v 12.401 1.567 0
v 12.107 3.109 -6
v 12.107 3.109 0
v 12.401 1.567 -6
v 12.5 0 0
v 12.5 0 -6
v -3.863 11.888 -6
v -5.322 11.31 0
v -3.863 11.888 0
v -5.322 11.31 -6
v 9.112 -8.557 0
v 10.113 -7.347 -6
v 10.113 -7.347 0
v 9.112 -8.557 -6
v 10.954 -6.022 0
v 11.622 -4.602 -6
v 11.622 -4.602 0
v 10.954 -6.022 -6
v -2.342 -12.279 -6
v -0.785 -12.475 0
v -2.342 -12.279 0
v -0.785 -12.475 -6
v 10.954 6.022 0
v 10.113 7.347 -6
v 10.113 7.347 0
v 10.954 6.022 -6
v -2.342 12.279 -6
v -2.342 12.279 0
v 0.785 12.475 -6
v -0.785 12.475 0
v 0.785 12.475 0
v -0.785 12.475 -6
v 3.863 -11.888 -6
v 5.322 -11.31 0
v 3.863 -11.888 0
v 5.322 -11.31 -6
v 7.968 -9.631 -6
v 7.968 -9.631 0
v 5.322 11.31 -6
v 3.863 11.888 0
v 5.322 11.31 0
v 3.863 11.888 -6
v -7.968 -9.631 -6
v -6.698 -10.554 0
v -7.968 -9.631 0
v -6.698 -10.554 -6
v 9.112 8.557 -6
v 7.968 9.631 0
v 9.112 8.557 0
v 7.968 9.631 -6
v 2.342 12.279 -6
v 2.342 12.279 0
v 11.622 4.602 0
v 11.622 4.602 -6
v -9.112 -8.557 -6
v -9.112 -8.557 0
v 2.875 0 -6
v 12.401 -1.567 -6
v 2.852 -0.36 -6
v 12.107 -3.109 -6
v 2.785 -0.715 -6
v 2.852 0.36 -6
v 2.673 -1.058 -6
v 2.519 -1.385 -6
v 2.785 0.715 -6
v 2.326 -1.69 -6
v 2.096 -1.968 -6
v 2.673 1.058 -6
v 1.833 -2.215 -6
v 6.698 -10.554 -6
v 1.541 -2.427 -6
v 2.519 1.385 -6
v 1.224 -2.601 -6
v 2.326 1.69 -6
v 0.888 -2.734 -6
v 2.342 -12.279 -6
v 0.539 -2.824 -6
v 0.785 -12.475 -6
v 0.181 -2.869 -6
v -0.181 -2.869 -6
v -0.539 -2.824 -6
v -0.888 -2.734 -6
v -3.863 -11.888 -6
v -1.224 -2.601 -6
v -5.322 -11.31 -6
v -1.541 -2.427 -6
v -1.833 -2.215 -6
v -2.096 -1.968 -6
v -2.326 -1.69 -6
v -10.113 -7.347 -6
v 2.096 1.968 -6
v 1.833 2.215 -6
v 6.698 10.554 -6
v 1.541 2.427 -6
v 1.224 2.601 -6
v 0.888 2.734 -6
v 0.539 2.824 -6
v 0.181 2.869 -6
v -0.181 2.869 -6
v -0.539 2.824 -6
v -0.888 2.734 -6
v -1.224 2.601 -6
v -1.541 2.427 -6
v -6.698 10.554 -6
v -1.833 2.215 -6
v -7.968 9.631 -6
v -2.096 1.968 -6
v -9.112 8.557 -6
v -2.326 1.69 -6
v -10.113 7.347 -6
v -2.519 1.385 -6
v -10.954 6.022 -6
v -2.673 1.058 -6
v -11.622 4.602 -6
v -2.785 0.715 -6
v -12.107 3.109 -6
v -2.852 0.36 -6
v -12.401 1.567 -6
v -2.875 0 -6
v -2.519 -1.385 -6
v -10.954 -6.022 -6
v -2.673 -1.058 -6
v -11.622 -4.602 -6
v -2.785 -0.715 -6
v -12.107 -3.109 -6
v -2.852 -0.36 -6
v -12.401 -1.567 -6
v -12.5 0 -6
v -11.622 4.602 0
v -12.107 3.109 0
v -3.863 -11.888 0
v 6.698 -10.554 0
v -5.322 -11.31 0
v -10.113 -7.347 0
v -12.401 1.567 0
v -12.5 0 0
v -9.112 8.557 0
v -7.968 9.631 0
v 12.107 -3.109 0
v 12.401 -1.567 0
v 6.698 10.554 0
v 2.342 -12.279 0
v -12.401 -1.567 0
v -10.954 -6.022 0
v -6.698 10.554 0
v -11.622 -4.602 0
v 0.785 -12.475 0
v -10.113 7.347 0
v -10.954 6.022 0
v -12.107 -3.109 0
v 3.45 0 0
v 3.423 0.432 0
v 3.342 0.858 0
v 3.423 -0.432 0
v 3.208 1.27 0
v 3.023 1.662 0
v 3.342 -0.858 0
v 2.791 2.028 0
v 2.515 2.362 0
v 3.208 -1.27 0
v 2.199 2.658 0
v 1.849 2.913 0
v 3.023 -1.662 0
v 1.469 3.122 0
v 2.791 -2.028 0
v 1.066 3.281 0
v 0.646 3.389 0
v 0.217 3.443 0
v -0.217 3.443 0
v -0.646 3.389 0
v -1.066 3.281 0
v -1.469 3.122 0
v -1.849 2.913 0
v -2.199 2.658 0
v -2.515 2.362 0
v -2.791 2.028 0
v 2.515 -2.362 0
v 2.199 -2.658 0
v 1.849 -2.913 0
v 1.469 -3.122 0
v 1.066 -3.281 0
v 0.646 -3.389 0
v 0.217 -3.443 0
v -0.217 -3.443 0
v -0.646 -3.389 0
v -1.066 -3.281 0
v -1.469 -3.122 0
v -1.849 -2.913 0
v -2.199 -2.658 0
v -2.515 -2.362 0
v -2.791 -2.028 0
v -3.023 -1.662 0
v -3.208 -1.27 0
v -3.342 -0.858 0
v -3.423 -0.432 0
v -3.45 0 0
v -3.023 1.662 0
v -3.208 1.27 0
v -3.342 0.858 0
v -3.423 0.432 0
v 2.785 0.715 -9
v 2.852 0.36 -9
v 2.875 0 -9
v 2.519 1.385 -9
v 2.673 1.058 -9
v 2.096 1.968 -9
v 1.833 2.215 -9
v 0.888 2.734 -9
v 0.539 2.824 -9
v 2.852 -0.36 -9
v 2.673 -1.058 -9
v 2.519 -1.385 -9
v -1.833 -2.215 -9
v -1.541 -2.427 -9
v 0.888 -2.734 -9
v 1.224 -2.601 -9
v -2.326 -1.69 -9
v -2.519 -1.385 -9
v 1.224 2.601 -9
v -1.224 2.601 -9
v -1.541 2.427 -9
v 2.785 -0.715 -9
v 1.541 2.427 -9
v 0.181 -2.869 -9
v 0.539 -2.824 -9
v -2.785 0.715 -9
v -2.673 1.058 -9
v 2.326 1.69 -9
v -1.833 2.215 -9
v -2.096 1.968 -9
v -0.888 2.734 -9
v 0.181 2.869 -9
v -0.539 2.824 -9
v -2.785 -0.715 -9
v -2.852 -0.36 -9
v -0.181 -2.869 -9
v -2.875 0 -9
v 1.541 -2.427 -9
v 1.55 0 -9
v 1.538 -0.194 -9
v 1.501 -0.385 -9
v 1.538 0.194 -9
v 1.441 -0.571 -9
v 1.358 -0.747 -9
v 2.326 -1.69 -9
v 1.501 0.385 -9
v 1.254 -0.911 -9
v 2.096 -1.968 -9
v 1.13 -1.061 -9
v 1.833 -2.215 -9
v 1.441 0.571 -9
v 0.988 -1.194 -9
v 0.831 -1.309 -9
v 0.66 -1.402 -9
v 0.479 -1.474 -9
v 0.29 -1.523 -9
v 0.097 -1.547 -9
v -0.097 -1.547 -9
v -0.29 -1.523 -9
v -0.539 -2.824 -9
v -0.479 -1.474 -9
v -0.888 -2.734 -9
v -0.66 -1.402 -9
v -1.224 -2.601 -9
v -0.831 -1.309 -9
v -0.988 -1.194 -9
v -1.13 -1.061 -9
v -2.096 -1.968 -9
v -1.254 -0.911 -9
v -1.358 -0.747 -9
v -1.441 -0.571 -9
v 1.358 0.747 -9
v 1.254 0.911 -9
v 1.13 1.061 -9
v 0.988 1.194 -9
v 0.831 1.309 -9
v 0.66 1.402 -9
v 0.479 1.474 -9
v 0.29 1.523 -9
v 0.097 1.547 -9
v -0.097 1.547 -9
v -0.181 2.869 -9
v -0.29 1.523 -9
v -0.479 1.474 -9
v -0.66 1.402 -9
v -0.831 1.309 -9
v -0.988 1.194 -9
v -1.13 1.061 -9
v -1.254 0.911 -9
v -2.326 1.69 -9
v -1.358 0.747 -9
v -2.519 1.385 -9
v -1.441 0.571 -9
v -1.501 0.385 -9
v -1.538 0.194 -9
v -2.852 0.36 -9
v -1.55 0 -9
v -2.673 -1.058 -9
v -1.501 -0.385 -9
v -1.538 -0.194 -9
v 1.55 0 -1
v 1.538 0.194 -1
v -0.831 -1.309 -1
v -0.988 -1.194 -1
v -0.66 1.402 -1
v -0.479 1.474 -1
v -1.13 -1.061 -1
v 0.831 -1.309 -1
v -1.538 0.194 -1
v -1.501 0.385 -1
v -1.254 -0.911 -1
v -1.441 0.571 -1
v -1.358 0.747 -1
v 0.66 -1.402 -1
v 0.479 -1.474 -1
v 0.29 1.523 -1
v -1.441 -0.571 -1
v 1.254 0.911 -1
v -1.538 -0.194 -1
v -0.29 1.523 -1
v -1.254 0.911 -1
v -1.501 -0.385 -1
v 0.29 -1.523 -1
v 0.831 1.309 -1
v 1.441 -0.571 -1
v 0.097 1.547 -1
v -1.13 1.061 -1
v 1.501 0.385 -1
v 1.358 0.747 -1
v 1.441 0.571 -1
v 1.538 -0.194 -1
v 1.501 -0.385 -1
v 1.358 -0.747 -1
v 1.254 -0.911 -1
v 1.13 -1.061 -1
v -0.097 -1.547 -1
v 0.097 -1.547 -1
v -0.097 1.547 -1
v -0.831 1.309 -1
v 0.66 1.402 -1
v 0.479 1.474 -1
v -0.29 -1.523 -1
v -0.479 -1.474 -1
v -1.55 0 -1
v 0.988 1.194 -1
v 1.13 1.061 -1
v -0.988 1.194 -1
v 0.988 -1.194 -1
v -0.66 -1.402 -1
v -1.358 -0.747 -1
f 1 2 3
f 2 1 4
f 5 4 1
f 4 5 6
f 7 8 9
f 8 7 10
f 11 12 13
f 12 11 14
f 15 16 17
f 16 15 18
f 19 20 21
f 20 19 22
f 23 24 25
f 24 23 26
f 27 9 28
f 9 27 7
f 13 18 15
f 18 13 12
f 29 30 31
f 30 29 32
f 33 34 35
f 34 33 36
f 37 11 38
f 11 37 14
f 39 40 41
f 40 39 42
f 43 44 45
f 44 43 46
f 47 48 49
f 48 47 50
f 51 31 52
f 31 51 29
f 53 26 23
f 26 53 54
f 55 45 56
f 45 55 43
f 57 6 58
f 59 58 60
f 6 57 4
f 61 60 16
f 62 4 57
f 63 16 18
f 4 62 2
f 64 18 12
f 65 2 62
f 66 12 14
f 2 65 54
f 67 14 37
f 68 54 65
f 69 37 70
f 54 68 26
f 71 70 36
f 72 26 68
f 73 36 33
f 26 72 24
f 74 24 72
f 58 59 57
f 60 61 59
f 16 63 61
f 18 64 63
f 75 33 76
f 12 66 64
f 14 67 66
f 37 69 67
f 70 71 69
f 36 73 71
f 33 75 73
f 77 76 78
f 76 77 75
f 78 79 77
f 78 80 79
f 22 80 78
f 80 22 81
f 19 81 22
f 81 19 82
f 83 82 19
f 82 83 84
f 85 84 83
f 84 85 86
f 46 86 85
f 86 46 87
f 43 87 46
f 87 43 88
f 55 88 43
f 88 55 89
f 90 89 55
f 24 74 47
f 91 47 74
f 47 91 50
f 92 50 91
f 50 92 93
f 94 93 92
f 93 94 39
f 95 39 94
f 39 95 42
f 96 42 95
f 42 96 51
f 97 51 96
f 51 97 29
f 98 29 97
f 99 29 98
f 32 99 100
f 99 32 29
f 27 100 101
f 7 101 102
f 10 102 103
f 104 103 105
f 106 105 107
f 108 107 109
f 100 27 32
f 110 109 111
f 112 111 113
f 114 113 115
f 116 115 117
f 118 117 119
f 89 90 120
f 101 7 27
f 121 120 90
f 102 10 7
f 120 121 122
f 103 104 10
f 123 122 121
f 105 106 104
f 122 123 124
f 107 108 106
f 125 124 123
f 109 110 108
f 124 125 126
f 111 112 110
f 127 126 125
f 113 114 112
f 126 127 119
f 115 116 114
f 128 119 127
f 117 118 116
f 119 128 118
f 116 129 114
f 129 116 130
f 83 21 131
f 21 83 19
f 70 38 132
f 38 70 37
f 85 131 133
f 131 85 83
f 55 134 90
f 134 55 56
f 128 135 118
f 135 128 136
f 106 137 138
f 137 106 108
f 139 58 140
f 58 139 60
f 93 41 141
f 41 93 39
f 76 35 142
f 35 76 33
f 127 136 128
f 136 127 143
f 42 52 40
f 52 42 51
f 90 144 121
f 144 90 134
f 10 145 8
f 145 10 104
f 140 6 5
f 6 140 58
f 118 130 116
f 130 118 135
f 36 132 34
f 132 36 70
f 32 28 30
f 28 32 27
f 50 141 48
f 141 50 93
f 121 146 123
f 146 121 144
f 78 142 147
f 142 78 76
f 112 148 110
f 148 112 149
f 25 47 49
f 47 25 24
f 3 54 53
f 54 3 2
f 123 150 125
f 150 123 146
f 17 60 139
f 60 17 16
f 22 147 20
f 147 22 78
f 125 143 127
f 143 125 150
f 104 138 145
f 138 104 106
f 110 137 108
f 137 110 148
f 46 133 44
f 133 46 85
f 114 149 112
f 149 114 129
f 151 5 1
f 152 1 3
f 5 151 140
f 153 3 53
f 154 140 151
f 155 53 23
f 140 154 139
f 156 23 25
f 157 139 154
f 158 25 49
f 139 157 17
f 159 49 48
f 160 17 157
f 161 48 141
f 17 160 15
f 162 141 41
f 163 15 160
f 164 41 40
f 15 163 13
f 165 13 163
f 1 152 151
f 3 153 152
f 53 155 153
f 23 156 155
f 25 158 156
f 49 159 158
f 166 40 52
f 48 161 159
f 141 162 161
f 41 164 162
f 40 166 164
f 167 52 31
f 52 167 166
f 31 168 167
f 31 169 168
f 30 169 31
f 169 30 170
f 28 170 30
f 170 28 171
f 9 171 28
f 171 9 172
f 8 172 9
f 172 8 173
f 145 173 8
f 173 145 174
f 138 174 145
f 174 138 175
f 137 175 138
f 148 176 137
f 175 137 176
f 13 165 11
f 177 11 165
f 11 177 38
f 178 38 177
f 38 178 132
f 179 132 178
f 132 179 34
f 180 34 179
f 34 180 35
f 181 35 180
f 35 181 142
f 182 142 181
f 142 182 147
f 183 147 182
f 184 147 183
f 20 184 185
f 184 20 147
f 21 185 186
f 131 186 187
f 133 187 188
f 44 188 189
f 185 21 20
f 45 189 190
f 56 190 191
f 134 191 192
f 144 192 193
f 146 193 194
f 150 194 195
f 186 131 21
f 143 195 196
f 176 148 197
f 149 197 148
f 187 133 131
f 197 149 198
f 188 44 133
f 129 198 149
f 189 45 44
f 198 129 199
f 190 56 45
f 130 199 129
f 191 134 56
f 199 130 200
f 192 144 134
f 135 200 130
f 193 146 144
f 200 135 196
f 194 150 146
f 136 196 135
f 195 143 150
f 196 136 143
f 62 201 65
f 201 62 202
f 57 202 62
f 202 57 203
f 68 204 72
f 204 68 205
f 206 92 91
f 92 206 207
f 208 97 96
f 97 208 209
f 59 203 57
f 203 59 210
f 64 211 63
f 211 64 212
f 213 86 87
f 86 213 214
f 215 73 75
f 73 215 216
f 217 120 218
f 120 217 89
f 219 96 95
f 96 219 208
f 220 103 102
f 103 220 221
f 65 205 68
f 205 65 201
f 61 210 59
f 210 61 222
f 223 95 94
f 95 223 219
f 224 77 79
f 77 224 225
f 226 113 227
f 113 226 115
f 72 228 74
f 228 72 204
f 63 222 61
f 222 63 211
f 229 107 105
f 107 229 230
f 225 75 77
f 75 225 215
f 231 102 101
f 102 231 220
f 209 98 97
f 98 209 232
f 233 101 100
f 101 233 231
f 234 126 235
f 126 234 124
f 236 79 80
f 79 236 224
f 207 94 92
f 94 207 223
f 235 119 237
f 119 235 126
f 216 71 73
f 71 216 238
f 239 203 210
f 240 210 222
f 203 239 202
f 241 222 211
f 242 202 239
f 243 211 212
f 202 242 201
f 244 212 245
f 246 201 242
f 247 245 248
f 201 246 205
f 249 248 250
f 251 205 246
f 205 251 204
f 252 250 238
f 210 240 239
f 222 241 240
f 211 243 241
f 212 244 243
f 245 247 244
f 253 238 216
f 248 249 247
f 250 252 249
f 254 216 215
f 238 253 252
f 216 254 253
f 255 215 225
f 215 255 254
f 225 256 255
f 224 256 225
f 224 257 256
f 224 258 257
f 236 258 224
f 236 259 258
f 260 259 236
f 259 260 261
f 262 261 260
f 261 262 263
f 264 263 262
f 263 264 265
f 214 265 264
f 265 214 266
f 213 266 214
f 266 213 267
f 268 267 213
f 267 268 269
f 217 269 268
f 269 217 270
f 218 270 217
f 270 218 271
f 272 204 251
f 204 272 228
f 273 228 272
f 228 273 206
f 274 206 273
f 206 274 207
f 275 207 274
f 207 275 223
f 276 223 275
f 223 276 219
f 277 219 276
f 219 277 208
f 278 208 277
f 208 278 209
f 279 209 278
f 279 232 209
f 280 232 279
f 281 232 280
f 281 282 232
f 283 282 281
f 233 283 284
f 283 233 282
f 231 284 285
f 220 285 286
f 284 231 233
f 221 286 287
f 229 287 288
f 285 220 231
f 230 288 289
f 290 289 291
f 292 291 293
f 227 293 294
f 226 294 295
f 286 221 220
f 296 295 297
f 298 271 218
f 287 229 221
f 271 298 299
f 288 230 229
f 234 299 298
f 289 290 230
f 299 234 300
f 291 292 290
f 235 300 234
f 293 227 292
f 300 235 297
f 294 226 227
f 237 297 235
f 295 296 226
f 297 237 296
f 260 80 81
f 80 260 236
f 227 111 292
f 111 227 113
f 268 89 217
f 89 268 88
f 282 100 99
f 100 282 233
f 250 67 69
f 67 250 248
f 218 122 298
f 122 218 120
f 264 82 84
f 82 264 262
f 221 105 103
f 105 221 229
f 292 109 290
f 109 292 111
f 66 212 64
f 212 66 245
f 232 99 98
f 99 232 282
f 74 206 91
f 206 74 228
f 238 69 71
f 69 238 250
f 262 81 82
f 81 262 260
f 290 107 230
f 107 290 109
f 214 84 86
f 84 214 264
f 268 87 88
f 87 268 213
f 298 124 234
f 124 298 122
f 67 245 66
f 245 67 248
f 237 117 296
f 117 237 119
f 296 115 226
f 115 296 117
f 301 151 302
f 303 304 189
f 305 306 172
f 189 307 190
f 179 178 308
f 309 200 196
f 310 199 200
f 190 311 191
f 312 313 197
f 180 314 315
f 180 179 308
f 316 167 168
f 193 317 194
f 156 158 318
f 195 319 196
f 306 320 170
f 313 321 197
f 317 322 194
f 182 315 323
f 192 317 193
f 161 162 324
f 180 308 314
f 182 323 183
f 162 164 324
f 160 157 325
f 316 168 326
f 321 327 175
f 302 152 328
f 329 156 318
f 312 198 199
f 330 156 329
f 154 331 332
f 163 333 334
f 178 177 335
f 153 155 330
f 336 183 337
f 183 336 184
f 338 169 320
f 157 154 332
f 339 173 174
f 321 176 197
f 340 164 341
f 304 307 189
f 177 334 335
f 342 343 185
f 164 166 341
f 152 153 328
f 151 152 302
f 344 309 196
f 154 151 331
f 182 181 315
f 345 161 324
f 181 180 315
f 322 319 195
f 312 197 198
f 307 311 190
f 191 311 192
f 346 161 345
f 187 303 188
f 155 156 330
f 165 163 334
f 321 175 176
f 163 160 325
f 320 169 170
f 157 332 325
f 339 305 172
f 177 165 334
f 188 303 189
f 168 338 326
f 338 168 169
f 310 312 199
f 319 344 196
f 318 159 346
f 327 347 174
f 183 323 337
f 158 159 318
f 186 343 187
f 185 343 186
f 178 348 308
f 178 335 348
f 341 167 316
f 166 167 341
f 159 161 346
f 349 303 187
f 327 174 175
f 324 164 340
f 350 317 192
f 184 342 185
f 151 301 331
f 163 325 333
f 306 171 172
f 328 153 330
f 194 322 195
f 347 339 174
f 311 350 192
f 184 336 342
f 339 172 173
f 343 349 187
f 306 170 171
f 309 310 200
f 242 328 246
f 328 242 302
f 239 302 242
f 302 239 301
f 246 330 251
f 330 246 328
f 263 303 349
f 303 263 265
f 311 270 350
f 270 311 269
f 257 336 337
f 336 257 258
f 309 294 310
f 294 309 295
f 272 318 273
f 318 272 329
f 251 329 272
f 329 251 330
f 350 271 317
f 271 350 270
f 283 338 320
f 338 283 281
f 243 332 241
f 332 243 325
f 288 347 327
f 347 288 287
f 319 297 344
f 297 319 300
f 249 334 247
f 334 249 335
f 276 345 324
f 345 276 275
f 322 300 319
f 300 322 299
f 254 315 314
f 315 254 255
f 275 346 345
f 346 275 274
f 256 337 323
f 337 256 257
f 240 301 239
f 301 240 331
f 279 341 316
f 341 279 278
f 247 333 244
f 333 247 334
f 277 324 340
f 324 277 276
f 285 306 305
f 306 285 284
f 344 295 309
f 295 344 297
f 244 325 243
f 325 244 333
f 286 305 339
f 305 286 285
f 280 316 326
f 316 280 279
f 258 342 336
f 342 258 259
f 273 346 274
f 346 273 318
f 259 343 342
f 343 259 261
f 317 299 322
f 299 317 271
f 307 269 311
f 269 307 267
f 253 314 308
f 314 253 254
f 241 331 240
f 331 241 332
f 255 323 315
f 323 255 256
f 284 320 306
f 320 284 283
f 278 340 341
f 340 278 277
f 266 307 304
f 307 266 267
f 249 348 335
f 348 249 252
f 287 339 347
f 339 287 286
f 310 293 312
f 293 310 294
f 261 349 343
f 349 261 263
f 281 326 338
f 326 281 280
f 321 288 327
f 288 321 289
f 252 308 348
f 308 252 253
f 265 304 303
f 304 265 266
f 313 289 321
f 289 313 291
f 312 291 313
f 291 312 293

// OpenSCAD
$fn = 50;

difference() {
	union() {
		translate(v = [0, 0, -6.0]) {
			cylinder(h = 6, r = 12.5);
		}
		#translate(v = [0, 0, -9.0]) {
			cylinder(h = 9, r = 2.875);
		}
	}
	union() {
		translate(v = [0, 0, 0]) {
			rotate(a = [0, 0, 0]) {
				difference() {
					union() {
						translate(v = [0, 0, -9.0]) {
							cylinder(h = 9, r = 1.25);
						}
						translate(v = [0, 0, -1.0]) {
							cylinder(h = 1.0, r1 = 1.55, r2 = 3.45);
						}
						translate(v = [0, 0, -9.0]) {
							cylinder(h = 9, r = 1.55);
						}
						translate(v = [0, 0, -9.0]) {
							cylinder(h = 9, r = 1.25);
						}
					}
					union();
				}
			}
		}
	}
}
